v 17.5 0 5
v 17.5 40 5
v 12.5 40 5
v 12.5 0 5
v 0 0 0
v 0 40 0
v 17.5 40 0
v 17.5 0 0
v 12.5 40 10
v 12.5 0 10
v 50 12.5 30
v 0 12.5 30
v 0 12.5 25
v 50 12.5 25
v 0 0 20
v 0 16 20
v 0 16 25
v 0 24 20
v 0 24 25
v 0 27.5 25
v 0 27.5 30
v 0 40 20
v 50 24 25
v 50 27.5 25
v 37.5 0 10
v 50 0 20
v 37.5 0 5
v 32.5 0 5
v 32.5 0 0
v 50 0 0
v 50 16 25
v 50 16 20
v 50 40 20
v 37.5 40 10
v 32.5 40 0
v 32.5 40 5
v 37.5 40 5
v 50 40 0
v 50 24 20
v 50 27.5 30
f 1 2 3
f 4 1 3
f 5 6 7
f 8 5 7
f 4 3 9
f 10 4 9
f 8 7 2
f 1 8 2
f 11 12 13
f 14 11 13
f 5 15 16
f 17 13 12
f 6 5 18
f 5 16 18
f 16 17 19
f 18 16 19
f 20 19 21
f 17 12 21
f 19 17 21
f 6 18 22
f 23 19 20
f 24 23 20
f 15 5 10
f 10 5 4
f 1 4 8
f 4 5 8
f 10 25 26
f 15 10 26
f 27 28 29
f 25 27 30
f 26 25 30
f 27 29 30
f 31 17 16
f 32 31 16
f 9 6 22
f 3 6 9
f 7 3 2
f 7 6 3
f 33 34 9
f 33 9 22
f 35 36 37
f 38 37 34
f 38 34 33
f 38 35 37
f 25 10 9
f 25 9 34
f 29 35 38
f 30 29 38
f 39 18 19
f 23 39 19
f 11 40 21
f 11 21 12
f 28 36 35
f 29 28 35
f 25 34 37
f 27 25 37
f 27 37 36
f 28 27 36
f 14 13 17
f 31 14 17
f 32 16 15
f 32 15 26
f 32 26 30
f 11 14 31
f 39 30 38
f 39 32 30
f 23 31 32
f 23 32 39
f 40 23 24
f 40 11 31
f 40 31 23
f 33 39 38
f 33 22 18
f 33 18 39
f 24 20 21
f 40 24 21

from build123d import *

# Parameters (mm, degrees)
BOX_W        = 50
BOX_H        = 40
BOX_DEPTH    = 20
POCKET_DEPTH = 40.001
PAD_DEPTH    = 50


with BuildPart() as pocket:
    # Box → Box (new body)
    with BuildSketch(Plane.XY):
        with Locations((25, 20)):
            Rectangle(BOX_W, BOX_H)
    extrude(amount=BOX_DEPTH)

    # Sketch → Pocket (cut, through all)
    with BuildSketch(Plane.XZ):
        Polygon((12.5, 5), (12.5, 10), (37.5, 10), (37.5, 5), (32.5, 5), (32.5, 0), (17.5, 0), (17.5, 5), align=None)
    extrude(amount=-POCKET_DEPTH, mode=Mode.SUBTRACT)


with BuildPart() as pad:
    # Pad base: copy of Pocket
    add(pocket.part)

    # Sketch001 → Pad (new body)
    with BuildSketch(Plane(origin=(0, 0, 0), x_dir=(0, -1, 0), z_dir=(-1, 0, 0))):
        Polygon((-27.5, 30), (-12.5, 30), (-12.5, 25), (-16, 25), (-16, 10), (-24, 10), (-24, 25), (-27.5, 25), align=None)
    extrude(amount=-PAD_DEPTH)


with BuildPart() as fusion:
    # Fusion base: copy of Pocket
    add(pocket.part)

    # Fusion: union Pad
    add(pad.part)


solid = fusion.part
